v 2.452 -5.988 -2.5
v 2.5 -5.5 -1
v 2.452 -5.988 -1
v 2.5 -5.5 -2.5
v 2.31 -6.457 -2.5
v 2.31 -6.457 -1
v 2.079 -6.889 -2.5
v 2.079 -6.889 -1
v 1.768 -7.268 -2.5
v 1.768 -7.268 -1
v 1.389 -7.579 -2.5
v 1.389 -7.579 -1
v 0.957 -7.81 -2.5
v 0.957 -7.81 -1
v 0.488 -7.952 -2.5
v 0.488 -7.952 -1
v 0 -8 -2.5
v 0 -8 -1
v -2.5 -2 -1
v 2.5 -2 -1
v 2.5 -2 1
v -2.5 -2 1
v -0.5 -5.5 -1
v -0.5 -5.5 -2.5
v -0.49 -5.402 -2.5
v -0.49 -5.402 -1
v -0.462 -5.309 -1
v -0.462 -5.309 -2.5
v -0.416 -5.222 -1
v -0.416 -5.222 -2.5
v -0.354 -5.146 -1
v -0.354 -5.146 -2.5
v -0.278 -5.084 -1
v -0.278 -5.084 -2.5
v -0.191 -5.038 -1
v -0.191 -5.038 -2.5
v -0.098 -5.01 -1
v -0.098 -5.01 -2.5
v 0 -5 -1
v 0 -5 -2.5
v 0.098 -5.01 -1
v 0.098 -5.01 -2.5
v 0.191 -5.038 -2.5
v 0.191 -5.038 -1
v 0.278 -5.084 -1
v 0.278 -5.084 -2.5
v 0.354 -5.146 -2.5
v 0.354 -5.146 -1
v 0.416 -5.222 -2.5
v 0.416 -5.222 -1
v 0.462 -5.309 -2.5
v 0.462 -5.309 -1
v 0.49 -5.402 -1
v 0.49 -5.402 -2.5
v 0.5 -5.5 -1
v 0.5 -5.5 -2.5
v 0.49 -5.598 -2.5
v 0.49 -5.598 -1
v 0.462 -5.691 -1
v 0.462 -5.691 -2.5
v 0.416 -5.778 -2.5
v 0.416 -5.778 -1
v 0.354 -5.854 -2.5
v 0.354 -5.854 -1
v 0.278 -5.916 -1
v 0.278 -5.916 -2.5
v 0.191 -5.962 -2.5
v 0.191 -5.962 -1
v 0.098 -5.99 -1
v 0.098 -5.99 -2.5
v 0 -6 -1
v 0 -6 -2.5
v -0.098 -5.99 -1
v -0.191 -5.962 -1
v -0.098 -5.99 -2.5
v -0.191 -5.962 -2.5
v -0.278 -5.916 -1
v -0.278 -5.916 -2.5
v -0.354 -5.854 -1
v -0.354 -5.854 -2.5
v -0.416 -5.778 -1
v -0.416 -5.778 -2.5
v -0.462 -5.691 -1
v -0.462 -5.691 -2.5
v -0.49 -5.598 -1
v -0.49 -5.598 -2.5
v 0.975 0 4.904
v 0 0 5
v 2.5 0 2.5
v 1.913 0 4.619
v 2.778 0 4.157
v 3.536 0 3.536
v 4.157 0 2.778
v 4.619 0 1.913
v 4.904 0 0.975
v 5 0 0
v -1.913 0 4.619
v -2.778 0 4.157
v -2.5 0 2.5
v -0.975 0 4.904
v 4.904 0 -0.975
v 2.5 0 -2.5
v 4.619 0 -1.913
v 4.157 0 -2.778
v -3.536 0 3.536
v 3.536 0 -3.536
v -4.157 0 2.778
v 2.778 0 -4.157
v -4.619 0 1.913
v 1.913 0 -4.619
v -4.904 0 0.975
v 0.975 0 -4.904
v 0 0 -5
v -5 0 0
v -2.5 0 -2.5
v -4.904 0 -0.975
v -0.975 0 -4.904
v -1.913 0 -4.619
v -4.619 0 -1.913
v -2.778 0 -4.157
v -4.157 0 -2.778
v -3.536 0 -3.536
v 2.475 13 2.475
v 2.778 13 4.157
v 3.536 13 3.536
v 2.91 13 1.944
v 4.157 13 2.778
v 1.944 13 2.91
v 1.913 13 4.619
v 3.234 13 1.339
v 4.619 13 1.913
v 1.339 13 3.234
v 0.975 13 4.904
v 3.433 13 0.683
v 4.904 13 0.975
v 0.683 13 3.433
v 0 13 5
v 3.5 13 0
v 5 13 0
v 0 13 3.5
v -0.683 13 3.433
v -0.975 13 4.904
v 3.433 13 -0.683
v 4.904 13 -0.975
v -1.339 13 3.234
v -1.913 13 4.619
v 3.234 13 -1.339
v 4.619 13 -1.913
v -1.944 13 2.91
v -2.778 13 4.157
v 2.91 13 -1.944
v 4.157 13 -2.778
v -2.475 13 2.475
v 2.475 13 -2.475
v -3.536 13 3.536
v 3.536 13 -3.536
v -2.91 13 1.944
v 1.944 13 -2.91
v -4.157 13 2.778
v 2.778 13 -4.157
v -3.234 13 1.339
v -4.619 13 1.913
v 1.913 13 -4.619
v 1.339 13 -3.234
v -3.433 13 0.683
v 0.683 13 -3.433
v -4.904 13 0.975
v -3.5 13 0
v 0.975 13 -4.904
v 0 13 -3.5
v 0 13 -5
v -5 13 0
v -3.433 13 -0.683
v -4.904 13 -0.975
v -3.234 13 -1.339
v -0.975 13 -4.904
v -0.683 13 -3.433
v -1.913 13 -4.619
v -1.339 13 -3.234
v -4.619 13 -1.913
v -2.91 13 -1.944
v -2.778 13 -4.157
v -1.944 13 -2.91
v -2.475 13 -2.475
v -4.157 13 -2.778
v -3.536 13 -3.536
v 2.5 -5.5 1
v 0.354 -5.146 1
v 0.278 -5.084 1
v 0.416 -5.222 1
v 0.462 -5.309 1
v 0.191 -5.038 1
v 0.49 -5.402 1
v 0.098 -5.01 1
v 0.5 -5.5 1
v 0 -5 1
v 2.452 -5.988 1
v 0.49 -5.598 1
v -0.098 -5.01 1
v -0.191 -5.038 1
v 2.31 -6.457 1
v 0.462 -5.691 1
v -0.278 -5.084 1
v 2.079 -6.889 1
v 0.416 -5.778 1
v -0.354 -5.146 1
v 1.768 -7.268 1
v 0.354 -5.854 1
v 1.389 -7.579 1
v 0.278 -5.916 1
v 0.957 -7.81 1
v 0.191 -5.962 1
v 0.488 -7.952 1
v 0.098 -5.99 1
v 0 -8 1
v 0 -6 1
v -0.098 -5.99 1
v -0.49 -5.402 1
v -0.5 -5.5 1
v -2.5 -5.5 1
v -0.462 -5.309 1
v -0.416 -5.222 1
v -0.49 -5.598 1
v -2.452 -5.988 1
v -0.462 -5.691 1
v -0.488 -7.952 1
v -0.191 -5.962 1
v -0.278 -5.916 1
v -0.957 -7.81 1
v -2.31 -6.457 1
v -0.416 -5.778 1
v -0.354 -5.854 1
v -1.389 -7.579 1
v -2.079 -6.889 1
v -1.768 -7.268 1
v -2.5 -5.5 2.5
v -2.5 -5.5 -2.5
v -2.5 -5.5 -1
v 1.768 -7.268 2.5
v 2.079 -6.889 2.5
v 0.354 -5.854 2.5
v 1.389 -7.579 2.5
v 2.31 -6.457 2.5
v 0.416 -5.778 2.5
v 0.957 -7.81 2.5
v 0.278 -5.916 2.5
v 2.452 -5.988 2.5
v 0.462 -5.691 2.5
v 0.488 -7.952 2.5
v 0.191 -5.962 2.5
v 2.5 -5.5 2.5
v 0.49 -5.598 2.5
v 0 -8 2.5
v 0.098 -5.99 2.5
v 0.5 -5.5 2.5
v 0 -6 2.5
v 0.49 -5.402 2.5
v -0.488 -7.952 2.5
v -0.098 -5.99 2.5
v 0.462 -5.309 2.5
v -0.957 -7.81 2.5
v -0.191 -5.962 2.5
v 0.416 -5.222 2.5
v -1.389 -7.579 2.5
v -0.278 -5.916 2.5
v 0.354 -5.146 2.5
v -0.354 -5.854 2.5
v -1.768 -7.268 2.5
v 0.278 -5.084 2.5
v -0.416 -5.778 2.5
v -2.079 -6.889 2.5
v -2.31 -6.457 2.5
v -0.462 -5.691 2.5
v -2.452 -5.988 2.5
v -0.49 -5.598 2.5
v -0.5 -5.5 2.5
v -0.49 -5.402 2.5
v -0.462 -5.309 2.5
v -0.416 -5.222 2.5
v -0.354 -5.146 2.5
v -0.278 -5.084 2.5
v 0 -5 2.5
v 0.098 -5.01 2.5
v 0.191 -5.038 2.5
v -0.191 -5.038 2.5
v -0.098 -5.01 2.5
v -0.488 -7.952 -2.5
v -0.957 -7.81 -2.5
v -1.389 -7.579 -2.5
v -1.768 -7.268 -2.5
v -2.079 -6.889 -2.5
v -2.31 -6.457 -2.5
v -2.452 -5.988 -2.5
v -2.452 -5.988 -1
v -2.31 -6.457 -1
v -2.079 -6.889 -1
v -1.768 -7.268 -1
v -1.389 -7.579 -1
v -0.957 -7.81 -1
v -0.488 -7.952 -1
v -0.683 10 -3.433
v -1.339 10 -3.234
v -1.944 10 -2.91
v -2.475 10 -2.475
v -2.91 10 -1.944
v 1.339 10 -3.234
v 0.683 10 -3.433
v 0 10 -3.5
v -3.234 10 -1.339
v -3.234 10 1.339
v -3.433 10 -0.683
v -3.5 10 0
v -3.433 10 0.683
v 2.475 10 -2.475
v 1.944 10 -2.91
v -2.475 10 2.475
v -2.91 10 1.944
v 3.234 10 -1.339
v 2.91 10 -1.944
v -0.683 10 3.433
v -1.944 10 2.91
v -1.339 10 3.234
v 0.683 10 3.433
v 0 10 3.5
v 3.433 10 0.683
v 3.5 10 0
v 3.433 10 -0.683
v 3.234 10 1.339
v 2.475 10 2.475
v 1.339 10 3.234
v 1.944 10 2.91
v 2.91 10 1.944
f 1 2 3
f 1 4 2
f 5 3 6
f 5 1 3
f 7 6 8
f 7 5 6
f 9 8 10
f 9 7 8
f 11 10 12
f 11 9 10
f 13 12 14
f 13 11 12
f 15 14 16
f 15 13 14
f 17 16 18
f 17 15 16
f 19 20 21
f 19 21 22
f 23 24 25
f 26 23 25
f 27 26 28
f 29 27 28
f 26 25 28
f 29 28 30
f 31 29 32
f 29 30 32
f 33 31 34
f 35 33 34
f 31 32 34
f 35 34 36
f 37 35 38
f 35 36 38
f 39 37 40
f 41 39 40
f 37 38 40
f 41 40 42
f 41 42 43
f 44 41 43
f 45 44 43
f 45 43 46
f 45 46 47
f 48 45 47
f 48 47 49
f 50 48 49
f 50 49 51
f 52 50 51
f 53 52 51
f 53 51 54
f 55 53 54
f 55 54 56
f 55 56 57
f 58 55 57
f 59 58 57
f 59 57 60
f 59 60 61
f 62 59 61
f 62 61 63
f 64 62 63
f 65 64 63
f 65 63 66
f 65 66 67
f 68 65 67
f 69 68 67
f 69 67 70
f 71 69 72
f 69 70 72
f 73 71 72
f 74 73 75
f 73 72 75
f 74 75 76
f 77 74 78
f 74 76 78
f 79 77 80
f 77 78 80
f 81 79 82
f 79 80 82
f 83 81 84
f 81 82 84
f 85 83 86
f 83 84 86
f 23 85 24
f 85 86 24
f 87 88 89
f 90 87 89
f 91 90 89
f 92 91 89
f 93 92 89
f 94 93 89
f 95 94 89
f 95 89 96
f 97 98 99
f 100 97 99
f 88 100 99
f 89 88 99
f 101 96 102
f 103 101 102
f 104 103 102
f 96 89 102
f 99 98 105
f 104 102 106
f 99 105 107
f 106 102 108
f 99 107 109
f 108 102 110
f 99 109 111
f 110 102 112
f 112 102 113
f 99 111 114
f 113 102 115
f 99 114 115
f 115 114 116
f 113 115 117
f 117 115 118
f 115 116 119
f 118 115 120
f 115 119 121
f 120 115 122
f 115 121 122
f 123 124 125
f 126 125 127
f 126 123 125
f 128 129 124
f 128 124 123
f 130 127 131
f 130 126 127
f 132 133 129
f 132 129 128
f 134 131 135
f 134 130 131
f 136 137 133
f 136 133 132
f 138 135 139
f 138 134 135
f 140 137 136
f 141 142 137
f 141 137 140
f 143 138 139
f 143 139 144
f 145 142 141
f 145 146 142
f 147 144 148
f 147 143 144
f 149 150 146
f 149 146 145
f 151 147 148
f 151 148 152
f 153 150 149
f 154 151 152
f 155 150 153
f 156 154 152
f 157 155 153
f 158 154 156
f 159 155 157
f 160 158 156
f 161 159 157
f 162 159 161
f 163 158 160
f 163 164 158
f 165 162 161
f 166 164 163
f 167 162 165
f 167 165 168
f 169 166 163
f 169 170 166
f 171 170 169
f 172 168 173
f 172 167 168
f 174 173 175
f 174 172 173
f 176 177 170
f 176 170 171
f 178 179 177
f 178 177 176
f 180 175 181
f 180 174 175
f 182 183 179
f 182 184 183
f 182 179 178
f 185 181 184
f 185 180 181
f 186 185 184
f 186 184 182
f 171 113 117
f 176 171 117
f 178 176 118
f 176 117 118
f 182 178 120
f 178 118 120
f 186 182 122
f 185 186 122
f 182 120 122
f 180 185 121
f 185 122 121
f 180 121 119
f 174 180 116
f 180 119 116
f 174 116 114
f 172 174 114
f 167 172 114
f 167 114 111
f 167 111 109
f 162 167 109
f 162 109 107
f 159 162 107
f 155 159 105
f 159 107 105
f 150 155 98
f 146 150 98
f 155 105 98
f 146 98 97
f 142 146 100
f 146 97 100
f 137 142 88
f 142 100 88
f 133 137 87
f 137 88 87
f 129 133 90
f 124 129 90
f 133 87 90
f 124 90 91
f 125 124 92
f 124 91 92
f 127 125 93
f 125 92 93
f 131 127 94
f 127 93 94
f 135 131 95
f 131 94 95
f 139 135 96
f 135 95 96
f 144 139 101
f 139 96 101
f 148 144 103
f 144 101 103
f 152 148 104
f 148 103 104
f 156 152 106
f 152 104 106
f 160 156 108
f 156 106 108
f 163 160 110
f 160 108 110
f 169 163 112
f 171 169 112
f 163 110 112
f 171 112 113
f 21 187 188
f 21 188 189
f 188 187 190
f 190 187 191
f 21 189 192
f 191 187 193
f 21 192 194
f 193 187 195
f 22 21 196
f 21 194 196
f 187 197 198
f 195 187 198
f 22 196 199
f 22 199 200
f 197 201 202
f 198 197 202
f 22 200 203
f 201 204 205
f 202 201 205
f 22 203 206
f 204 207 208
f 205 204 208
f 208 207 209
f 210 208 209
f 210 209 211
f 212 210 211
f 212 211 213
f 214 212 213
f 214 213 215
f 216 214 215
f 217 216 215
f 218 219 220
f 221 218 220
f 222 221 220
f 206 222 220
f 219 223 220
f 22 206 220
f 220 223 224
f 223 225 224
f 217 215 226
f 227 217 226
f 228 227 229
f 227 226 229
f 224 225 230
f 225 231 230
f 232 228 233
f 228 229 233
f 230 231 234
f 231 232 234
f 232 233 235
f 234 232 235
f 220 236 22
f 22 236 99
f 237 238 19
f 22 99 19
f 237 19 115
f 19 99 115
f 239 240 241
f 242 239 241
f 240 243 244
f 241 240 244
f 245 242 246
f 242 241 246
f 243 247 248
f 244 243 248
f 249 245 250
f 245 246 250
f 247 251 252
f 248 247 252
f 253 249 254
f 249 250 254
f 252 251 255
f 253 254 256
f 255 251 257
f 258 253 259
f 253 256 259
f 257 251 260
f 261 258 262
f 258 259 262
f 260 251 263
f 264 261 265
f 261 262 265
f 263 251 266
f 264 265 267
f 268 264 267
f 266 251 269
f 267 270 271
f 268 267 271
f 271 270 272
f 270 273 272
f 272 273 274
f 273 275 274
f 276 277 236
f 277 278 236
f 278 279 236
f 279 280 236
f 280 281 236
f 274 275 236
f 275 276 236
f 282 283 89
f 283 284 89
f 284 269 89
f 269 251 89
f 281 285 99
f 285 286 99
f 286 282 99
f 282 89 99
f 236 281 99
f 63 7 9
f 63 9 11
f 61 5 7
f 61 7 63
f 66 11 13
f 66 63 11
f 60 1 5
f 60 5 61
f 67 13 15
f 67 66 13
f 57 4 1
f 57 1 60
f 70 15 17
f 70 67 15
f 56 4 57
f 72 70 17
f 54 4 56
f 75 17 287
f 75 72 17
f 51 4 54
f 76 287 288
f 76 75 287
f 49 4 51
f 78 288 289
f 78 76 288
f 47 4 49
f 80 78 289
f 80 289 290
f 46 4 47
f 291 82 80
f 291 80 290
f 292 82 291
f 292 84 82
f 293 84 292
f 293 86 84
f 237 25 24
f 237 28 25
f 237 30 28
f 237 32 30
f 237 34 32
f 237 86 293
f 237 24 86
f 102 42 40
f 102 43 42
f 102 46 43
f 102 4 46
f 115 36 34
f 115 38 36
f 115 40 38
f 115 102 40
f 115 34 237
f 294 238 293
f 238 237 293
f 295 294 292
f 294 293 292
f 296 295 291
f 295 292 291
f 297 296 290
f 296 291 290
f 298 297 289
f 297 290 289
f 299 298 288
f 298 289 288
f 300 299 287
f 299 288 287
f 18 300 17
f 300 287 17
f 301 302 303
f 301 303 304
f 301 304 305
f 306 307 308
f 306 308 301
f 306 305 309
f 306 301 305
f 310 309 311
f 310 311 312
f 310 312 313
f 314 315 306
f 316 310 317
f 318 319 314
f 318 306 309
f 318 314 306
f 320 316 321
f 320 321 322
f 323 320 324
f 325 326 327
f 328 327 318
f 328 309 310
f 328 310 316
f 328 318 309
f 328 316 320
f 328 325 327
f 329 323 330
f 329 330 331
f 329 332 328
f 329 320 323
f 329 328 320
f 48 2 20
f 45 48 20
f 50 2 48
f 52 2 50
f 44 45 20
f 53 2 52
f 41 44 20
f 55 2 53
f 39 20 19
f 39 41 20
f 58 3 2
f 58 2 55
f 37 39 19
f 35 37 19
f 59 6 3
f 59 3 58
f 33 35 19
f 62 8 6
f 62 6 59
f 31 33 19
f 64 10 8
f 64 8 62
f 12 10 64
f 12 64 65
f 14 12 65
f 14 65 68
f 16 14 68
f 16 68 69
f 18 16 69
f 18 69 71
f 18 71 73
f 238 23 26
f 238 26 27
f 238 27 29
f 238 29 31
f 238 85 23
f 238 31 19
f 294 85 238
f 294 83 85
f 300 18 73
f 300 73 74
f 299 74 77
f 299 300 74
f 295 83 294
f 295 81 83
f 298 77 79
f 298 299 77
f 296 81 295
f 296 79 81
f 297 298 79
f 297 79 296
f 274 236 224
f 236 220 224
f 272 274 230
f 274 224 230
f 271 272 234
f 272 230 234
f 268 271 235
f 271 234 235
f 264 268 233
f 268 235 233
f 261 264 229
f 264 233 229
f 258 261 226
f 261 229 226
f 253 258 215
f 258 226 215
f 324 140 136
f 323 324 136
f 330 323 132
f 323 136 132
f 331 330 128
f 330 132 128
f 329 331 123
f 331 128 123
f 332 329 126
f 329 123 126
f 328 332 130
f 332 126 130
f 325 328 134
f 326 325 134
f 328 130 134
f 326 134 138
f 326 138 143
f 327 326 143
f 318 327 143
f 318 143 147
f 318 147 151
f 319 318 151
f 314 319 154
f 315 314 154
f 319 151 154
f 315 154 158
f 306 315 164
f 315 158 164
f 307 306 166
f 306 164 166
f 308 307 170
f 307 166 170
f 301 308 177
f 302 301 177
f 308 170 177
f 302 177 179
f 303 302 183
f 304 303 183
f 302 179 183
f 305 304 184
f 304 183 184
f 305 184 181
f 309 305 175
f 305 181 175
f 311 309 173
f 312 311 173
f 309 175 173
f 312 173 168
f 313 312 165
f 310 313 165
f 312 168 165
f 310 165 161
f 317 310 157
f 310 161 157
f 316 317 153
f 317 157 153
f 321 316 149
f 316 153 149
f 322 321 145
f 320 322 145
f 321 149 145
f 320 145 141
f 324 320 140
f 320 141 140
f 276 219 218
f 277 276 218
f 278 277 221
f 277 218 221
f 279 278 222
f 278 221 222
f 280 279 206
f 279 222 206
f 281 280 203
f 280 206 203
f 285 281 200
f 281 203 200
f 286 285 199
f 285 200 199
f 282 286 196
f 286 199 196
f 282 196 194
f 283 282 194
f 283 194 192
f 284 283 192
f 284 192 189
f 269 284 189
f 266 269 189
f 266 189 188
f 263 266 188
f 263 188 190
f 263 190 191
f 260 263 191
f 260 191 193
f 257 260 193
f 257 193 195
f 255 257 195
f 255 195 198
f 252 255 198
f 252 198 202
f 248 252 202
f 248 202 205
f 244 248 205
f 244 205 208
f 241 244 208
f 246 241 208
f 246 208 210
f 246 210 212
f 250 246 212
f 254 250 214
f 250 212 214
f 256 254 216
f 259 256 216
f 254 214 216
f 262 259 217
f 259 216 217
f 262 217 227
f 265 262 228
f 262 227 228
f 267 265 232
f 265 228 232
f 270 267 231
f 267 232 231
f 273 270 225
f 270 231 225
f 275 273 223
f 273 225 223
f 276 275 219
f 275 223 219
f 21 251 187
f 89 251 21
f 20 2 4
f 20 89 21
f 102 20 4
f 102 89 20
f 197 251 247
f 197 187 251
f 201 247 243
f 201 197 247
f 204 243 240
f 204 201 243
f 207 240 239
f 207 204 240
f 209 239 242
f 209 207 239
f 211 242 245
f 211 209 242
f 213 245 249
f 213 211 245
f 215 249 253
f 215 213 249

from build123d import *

# Parameters (mm, degrees)
SKETCH1_R           = 5
BOSS_EXTRUDE1_DEPTH = 13
SKETCH2_R           = 3.5
CUT_EXTRUDE1_DEPTH  = 3
SKETCH3_W           = 5
SKETCH3_H           = 5
BOSS_EXTRUDE2_DEPTH = 8
SKETCH4_W           = 5
SKETCH4_H           = 2
CUT_EXTRUDE2_DEPTH  = 6
FILLET2_R           = 2.5
SKETCH5_R           = 0.5
CUT_EXTRUDE4_DEPTH  = 16.81929202


with BuildPart() as part:
    # Sketch1 → Boss-Extrude1 (new body)
    with BuildSketch(Plane(origin=(0, 0, 0), x_dir=(1, 0, 0), z_dir=(0, 1, 0))):
        with Locations(Location((0, 0, 0), (0, 0, 90))):
            Circle(SKETCH1_R)
    extrude(amount=BOSS_EXTRUDE1_DEPTH)

    # Sketch2 → Cut-Extrude1 (cut)
    with BuildSketch(Plane(origin=(0, 13, 0), x_dir=(1, 0, 0), z_dir=(0, 1, 0))):
        with Locations(Location((0, 0, 0), (0, 0, 270))):
            Circle(SKETCH2_R)
    extrude(amount=-CUT_EXTRUDE1_DEPTH, mode=Mode.SUBTRACT)

    # Sketch3 → Boss-Extrude2 (add)
    with BuildSketch(Plane(origin=(0, 0, 0), x_dir=(-1, 0, 0), z_dir=(0, -1, 0))):
        Rectangle(SKETCH3_W, SKETCH3_H)
    extrude(amount=BOSS_EXTRUDE2_DEPTH)

    # Sketch4 → Cut-Extrude2 (cut)
    with BuildSketch(Plane(origin=(0, -8, 0), x_dir=(-1, 0, 0), z_dir=(0, -1, 0))):
        Rectangle(SKETCH4_W, SKETCH4_H)
    extrude(amount=-CUT_EXTRUDE2_DEPTH, mode=Mode.SUBTRACT)

    # Fillet2
    fillet2_edges = [part.edges().sort_by_distance(p)[0] for p in [
        (-2.5, -8, 1.75),
        (2.5, -8, 1.75),
        (2.5, -8, -1.75),
        (-2.5, -8, -1.75),
    ]]
    fillet(fillet2_edges, radius=FILLET2_R - 0.0001)  # a hair under: the kernel refuses the full size

    # Sketch5 → Cut-Extrude4 (cut, through all)
    with BuildSketch(Plane(origin=(0, 0, -2.5), x_dir=(-1, 0, 0), z_dir=(0, 0, -1))):
        with Locations((0, -5.5)):
            Circle(SKETCH5_R)
    extrude(amount=-CUT_EXTRUDE4_DEPTH, mode=Mode.SUBTRACT)


solid = part.part
